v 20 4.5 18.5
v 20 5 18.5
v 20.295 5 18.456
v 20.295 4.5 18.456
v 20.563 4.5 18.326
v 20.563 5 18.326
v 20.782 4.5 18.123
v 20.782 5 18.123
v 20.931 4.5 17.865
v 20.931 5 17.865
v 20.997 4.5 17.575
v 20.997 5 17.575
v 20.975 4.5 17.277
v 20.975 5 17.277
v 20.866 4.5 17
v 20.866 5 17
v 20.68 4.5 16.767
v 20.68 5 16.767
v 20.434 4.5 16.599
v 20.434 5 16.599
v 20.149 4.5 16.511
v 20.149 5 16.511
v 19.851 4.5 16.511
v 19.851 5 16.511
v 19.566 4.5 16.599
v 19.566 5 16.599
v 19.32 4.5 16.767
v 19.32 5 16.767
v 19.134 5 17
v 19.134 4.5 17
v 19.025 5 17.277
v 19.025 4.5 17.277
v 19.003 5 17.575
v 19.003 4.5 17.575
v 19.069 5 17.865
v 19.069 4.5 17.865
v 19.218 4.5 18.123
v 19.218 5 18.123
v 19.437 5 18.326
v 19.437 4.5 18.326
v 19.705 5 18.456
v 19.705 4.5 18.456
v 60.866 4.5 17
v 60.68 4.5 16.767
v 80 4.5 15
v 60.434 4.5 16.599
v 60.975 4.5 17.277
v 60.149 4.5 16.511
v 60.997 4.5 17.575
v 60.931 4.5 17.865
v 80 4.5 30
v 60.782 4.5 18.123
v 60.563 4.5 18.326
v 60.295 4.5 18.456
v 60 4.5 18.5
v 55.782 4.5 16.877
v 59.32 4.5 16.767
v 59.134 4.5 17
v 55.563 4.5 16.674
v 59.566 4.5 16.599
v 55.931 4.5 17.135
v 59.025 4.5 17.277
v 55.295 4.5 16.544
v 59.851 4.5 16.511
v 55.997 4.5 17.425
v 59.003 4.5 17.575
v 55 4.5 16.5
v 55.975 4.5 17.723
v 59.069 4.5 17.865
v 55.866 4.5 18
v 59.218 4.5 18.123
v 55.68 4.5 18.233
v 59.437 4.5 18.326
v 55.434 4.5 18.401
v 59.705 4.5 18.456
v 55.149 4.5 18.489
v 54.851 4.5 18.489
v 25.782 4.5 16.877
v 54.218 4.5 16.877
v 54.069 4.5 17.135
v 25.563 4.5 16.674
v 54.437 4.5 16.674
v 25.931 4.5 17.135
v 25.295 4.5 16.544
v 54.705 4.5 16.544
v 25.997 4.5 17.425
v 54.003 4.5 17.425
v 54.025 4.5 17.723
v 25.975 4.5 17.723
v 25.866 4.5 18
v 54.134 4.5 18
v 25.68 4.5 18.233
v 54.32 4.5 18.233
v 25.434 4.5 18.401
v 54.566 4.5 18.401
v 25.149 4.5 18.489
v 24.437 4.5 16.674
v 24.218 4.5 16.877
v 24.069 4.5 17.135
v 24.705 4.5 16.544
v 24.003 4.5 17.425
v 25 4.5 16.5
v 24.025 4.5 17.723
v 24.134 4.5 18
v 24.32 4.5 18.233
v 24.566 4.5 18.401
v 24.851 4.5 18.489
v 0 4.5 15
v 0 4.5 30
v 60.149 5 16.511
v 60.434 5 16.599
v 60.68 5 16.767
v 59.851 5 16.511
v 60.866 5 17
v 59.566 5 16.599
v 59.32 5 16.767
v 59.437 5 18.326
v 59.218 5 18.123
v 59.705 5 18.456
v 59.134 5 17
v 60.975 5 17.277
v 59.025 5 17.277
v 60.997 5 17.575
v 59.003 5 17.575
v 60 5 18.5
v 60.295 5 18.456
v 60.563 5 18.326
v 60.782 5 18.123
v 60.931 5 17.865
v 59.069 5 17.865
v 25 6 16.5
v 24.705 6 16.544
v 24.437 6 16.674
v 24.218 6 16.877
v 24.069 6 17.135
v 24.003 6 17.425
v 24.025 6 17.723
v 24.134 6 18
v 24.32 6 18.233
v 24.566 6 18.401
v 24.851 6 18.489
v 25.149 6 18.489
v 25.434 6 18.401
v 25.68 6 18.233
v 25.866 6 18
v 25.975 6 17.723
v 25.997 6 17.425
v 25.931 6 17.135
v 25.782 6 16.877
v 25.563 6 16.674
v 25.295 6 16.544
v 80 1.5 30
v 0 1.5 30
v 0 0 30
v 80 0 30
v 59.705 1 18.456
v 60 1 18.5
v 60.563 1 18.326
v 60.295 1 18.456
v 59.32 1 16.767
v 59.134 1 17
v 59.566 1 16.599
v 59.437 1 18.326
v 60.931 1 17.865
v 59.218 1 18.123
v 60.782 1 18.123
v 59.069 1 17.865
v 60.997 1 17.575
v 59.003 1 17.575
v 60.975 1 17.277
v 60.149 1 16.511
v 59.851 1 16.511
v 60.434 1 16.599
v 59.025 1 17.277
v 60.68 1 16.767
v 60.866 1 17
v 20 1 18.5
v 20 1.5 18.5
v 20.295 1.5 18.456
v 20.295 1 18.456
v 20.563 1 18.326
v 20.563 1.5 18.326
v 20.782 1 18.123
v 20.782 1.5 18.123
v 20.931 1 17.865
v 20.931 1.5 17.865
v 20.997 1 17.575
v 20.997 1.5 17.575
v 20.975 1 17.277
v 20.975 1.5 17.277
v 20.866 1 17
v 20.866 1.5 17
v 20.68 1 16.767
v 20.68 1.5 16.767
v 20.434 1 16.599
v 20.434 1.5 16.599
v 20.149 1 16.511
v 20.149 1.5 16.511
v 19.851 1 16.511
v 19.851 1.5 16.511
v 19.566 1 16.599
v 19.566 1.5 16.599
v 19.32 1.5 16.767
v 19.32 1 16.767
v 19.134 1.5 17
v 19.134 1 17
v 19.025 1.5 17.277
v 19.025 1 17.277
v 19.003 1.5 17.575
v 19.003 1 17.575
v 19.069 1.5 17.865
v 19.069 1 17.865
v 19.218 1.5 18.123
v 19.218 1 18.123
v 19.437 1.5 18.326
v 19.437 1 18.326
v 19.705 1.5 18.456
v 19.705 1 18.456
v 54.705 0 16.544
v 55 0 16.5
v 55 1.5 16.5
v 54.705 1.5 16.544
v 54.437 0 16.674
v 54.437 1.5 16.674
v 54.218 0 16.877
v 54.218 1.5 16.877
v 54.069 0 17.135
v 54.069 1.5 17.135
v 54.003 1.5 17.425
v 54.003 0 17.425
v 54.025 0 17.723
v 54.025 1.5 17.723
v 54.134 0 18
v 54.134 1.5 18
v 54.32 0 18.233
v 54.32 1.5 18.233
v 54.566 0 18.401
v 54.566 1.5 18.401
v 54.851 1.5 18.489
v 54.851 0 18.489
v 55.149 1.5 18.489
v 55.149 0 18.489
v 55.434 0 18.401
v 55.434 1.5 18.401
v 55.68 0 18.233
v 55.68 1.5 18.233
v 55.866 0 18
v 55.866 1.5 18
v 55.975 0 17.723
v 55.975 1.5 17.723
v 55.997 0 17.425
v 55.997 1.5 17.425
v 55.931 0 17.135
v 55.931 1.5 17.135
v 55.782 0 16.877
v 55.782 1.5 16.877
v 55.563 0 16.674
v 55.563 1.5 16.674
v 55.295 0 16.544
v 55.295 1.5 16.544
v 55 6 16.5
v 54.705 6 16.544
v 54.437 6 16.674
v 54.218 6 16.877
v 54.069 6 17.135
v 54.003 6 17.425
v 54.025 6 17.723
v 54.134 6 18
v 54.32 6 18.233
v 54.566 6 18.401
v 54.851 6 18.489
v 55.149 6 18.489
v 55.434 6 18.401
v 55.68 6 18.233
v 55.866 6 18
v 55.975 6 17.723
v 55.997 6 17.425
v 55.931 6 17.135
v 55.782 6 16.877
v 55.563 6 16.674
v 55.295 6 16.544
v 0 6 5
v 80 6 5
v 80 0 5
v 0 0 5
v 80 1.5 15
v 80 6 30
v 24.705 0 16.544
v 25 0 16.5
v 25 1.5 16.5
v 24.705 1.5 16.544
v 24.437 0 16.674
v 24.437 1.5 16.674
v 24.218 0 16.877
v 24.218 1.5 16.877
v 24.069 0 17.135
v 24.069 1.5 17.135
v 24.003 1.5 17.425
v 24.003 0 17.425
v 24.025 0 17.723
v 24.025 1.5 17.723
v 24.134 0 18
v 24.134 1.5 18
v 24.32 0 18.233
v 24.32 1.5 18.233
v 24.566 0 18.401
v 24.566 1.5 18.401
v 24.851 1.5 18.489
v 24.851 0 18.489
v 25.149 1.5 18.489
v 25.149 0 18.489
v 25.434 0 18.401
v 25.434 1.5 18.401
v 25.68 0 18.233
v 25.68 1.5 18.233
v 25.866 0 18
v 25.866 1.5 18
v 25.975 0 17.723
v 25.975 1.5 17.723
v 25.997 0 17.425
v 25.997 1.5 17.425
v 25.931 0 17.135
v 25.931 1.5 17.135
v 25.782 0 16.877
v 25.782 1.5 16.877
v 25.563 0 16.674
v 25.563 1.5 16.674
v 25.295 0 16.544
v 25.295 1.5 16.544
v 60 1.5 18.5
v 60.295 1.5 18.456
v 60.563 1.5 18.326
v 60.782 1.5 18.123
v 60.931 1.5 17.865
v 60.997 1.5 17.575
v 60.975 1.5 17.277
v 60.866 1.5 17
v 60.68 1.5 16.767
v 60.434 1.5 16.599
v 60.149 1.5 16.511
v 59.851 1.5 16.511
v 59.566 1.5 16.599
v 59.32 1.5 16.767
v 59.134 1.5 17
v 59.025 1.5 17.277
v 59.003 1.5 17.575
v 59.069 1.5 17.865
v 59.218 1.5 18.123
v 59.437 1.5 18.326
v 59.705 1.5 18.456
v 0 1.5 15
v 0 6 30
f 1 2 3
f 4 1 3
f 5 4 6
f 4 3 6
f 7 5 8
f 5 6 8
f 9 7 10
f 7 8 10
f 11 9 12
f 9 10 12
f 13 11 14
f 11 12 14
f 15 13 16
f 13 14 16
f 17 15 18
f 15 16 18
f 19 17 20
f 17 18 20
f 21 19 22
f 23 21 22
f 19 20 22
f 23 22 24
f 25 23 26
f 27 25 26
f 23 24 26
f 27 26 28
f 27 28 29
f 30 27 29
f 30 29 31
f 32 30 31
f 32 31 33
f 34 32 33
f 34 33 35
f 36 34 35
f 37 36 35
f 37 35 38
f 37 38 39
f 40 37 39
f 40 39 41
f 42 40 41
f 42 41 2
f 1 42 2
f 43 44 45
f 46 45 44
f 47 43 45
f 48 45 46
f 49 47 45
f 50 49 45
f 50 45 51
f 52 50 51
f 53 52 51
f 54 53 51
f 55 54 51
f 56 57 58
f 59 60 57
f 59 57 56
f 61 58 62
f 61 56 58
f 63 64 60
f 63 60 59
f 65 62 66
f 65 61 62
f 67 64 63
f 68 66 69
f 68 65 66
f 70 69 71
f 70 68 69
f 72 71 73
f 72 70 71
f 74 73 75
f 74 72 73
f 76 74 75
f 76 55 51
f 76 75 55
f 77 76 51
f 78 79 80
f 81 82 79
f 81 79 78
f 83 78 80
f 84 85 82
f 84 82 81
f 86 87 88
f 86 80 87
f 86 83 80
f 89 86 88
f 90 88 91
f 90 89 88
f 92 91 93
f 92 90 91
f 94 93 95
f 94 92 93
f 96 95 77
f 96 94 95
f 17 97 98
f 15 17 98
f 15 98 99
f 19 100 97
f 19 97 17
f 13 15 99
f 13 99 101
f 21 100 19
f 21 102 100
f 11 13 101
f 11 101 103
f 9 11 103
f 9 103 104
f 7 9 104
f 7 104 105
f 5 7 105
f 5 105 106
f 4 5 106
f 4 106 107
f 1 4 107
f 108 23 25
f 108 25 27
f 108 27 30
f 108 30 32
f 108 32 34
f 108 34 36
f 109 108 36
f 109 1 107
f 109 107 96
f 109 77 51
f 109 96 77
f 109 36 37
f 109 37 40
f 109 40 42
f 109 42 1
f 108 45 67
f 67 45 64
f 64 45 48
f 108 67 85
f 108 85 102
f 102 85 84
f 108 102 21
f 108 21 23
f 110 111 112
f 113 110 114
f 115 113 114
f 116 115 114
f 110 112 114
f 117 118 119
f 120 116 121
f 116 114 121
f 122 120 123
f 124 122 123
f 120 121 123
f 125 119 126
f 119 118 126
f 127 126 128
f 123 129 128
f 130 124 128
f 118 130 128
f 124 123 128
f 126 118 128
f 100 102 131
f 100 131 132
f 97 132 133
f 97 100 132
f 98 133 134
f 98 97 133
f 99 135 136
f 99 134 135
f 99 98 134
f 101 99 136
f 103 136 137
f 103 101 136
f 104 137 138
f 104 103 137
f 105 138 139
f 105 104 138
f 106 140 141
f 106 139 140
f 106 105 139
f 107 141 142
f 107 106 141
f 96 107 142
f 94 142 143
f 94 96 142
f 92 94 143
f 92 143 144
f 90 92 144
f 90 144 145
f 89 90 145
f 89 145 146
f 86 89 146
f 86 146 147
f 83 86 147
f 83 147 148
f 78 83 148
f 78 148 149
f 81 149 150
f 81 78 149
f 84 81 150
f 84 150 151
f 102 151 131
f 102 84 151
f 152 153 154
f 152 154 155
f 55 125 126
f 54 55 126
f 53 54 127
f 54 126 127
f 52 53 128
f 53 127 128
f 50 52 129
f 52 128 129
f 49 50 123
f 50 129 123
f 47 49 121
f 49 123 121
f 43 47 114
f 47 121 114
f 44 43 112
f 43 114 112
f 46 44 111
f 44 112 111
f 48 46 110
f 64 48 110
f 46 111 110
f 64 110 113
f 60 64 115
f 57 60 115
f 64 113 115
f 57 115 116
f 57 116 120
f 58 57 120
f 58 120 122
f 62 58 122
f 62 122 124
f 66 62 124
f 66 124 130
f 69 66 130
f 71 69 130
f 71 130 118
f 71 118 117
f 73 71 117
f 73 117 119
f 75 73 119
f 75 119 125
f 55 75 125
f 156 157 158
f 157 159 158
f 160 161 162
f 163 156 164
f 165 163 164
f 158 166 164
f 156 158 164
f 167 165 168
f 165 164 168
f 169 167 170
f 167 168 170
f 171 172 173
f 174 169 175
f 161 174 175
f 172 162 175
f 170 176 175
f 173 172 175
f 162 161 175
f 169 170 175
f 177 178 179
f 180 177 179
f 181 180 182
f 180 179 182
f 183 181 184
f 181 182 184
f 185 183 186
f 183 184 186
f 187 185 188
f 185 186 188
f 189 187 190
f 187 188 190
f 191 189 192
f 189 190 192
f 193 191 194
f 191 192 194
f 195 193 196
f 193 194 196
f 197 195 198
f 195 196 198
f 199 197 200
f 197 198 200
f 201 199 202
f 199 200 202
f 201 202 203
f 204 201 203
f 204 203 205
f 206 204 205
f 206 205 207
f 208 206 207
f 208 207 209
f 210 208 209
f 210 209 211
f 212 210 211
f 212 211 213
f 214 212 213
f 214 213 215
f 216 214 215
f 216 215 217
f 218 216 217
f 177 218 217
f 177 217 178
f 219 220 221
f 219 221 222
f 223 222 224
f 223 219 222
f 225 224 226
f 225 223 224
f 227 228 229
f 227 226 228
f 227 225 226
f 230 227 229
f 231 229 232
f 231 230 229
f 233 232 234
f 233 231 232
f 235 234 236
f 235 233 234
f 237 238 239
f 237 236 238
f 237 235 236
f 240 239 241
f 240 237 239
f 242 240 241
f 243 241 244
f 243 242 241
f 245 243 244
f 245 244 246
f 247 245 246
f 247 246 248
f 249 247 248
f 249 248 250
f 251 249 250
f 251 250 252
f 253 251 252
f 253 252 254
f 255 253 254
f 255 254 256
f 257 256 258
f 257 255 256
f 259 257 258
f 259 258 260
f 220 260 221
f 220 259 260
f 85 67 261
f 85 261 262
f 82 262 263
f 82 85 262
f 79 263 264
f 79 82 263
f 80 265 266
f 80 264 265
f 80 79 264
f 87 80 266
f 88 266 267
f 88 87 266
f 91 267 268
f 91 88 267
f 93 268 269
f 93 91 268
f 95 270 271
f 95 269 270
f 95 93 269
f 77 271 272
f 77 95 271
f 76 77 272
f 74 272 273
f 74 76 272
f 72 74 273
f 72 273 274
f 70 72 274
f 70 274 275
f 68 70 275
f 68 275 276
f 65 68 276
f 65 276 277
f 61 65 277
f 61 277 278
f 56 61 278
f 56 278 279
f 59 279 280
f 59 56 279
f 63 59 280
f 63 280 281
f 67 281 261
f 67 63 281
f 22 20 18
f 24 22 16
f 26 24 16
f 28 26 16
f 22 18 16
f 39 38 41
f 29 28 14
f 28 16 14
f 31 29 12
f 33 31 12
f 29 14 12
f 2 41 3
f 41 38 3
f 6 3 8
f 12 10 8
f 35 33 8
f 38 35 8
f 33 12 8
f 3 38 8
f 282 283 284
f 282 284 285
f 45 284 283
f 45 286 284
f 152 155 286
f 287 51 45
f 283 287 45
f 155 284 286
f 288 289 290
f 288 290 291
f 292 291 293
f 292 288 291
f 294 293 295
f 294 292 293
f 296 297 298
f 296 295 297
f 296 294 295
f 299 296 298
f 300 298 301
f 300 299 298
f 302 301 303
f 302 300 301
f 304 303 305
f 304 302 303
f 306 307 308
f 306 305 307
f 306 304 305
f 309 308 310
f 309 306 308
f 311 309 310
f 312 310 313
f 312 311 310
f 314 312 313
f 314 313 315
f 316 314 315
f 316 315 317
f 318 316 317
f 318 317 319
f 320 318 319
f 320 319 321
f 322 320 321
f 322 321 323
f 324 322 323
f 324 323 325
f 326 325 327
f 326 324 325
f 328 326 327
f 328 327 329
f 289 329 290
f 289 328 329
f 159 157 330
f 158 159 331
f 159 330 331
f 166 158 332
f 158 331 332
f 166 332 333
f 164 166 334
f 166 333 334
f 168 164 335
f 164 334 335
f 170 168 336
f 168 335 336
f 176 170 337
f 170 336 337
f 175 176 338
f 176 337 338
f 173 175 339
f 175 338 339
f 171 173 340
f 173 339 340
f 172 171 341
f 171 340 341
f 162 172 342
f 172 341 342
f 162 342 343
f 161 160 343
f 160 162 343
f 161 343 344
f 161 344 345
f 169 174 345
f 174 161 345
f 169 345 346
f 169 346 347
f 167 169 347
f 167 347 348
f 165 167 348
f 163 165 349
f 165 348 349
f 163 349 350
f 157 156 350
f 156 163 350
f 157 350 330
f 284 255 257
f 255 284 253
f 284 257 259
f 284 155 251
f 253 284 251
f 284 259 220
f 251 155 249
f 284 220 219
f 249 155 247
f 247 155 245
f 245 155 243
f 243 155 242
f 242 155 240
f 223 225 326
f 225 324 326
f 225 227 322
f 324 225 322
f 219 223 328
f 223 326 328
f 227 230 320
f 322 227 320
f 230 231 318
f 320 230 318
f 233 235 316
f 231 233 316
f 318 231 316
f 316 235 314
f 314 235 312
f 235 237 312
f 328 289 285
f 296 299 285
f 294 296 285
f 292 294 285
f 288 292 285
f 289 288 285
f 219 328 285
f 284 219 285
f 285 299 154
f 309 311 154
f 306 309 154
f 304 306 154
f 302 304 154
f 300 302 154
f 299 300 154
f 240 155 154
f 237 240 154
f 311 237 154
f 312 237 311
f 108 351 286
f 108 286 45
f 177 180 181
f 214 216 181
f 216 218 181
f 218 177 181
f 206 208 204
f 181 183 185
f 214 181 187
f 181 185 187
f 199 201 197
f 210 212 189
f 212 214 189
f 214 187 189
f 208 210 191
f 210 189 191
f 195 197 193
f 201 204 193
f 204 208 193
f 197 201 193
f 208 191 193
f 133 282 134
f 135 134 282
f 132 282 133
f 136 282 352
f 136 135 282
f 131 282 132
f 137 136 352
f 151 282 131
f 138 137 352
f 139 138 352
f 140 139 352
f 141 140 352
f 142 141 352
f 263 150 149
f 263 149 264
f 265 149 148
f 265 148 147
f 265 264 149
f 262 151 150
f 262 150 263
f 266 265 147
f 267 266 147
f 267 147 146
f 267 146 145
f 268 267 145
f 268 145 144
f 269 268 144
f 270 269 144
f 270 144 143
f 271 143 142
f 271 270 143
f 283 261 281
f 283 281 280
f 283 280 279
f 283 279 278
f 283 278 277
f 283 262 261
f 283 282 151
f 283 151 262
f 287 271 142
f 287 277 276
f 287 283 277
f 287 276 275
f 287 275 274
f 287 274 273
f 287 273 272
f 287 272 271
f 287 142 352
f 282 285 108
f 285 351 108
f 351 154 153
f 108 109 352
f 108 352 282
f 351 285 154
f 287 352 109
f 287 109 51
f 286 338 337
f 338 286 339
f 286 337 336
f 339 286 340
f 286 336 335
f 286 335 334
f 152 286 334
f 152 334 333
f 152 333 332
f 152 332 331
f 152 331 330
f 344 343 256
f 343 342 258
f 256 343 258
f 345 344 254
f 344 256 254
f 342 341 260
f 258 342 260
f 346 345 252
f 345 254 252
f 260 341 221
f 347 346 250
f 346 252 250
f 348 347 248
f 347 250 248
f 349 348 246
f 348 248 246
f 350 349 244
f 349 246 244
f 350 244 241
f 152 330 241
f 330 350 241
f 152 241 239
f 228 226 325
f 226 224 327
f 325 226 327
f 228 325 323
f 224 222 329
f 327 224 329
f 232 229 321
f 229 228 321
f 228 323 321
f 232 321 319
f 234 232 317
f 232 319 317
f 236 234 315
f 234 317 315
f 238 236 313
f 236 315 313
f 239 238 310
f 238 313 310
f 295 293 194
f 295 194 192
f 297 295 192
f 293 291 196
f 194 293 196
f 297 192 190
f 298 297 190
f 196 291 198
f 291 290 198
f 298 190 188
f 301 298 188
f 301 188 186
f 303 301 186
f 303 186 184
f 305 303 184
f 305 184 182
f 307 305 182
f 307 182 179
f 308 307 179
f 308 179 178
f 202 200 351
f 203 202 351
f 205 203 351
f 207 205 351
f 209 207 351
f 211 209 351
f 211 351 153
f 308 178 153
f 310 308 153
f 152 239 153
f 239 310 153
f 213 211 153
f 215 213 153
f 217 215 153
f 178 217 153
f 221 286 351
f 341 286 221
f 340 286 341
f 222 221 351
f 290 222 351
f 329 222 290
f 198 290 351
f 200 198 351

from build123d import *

# Parameters (mm, degrees)
CROQUIS1_W                 = 80
CROQUIS1_H                 = 6
SALIENTE_EXTRUIR4_DEPTH    = 10
CROQUIS5_W                 = 80
CROQUIS5_H                 = 6
SALIENTE_EXTRUIR6_DEPTH    = 10
CROQUIS7_W                 = 80
CROQUIS7_H                 = 1.5
SALIENTE_EXTRUIR7_DEPTH    = 10
CROQUIS9_W                 = 5
CROQUIS9_H                 = 3
CORTAR_EXTRUIR3_DEPTH      = 80
CROQUIS12_W                = 80
CROQUIS12_H                = 6
CORTAR_EXTRUIR4_DEPTH      = 10
CROQUIS13_W                = 80
CROQUIS13_H                = 6
SALIENTE_EXTRUIR8_DEPTH    = 5
CROQUIS14_R                = 1
CORTAR_EXTRUIR5_DEPTH      = 25
CROQUIS15_R                = 1
SALIENTE_EXTRUIR9_DEPTH    = 1
SALIENTE_EXTRUIR10_START   = -1
CROQUIS16_R                = 1
SALIENTE_EXTRUIR10_DEPTH   = 1
CORTAR_EXTRUIR6_DEPTH      = 86.650452421
CORTAR_EXTRUIR6_DEPTH_BACK = 25
CROQUIS17_R                = 1


with BuildPart() as part:
    # Croquis1 → Saliente-Extruir4 (new body)
    with BuildSketch(Plane.XY):
        with Locations((40, 3)):
            Rectangle(CROQUIS1_W, CROQUIS1_H)
    extrude(amount=SALIENTE_EXTRUIR4_DEPTH)

    # Croquis5 → Saliente-Extruir6 (add)
    with BuildSketch(Plane.XY.offset(10)):
        with Locations((40, 3)):
            Rectangle(CROQUIS5_W, CROQUIS5_H)
    extrude(amount=SALIENTE_EXTRUIR6_DEPTH)

    # Croquis7 → Saliente-Extruir7 (add)
    with BuildSketch(Plane.XY.offset(20)):
        with Locations((40, 5.25)):
            Rectangle(CROQUIS7_W, CROQUIS7_H)
        with Locations((40, 0.75)):
            Rectangle(CROQUIS7_W, CROQUIS7_H)
    extrude(amount=SALIENTE_EXTRUIR7_DEPTH)

    # Croquis9 → Cortar-Extruir3 (cut)
    with BuildSketch(Plane.ZY):
        with Locations((17.5, 3)):
            Rectangle(CROQUIS9_W, CROQUIS9_H)
    extrude(amount=-CORTAR_EXTRUIR3_DEPTH, mode=Mode.SUBTRACT)

    # Croquis12 → Cortar-Extruir4 (cut)
    with BuildSketch(Plane(origin=(0, 0, 0), x_dir=(-1, 0, 0), z_dir=(0, 0, -1))):
        with Locations((-40, 3)):
            Rectangle(CROQUIS12_W, CROQUIS12_H)
    extrude(amount=-CORTAR_EXTRUIR4_DEPTH, mode=Mode.SUBTRACT)

    # Croquis13 → Saliente-Extruir8 (add)
    with BuildSketch(Plane(origin=(0, 0, 10), x_dir=(-1, 0, 0), z_dir=(0, 0, -1))):
        with Locations((-40, 3)):
            Rectangle(CROQUIS13_W, CROQUIS13_H)
    extrude(amount=SALIENTE_EXTRUIR8_DEPTH)

    # Croquis14 → Cortar-Extruir5 (cut)
    with BuildSketch(Plane(origin=(0, 6, 0), x_dir=(1, 0, 0), z_dir=(0, 1, 0))):
        with Locations(Location((20, -17.5, 0), (0, 0, 270))):
            Circle(CROQUIS14_R)
        with Locations(Location((60, -17.5, 0), (0, 0, 270))):
            Circle(CROQUIS14_R)
    extrude(amount=-CORTAR_EXTRUIR5_DEPTH, mode=Mode.SUBTRACT)

    # Croquis15 → Saliente-Extruir9 (add)
    with BuildSketch(Plane(origin=(0, 6, 0), x_dir=(1, 0, 0), z_dir=(0, 1, 0))):
        with Locations(Location((20, -17.5, 0), (0, 0, 270))):
            Circle(CROQUIS15_R)
        with Locations(Location((60, -17.5, 0), (0, 0, 270))):
            Circle(CROQUIS15_R)
    extrude(amount=-SALIENTE_EXTRUIR9_DEPTH)

    # Croquis16 → Saliente-Extruir10 (add)
    with BuildSketch(Plane.XZ.offset(SALIENTE_EXTRUIR10_START)):
        with Locations(Location((20, 17.5, 0), (0, 0, 270))):
            Circle(CROQUIS16_R)
        with Locations(Location((60, 17.5, 0), (0, 0, 270))):
            Circle(CROQUIS16_R)
    extrude(amount=SALIENTE_EXTRUIR10_DEPTH)

    # Croquis17 → Cortar-Extruir6 (cut, two sides: drawn at the far end of the back side and taken through both)
    with BuildSketch(Plane(origin=(0, 6, 0), x_dir=(1, 0, 0), z_dir=(0, 1, 0)).offset(-CORTAR_EXTRUIR6_DEPTH_BACK)):
        with Locations(Location((25, -17.5, 0), (0, 0, 90))):
            Circle(CROQUIS17_R)
        with Locations(Location((55, -17.5, 0), (0, 0, 90))):
            Circle(CROQUIS17_R)
    extrude(amount=CORTAR_EXTRUIR6_DEPTH + CORTAR_EXTRUIR6_DEPTH_BACK, mode=Mode.SUBTRACT)


solid = part.part
